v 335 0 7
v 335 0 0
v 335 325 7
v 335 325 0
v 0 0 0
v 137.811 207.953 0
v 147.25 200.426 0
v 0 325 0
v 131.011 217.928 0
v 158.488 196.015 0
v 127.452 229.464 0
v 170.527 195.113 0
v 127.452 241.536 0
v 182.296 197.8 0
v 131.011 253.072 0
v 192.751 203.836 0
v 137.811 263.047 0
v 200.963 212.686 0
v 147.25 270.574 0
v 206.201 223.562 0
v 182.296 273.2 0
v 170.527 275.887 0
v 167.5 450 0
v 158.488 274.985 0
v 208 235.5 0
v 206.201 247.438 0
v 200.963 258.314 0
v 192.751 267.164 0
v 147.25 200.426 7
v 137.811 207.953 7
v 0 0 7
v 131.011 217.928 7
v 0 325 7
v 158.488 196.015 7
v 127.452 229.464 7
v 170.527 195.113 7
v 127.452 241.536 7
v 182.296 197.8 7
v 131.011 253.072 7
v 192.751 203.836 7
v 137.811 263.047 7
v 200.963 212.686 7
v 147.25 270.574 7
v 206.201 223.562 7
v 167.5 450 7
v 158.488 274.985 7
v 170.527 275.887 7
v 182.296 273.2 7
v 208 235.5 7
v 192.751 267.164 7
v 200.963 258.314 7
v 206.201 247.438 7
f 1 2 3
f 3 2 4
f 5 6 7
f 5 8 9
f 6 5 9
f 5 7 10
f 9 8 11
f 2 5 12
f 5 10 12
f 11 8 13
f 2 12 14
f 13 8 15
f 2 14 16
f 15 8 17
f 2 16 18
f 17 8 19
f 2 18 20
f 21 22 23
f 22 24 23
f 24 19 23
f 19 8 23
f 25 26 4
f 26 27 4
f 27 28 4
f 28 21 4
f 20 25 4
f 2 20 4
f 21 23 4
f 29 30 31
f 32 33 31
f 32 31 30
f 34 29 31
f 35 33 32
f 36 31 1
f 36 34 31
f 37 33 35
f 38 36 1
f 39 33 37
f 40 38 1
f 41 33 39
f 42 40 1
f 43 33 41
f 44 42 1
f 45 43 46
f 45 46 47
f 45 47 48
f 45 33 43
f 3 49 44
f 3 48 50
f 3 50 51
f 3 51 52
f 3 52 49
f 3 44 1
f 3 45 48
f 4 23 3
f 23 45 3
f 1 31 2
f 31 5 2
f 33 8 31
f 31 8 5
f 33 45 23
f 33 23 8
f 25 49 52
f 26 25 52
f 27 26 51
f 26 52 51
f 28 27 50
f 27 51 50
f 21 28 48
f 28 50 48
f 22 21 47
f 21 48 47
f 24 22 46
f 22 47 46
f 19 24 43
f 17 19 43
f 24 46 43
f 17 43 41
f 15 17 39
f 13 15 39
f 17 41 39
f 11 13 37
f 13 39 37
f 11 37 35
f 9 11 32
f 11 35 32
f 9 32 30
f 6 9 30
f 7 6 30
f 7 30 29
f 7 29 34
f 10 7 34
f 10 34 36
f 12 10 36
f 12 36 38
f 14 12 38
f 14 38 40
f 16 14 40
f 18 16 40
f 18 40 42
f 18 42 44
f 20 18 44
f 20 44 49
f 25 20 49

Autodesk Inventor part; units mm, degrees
ref_plane "YZ Plane" through (0, 0, 0) normal (1, 0, 0) x (0, 1, 0)
ref_plane "XZ Plane" through (0, 0, 0) normal (0, 1, 0) x (-1, 0, 0)
ref_plane "XY Plane" through (0, 0, 0) normal (0, 0, 1) x (1, 0, 0)
sketch "Sketch1" plane through (0, 0, 0) normal (0, 0, 1) x (1, 0, 0)
  point P0 (0, 0)
sketch "Sketch2" plane through (0, 0, 0) normal (0, 0, 1) x (1, 0, 0)
  line L0 (0, 0) -> (335, 0)
  line L1 (335, 0) -> (335, 450)
  line L2 (335, 450) -> (0, 450)
  line L3 (0, 450) -> (0, 0)
  line L4 (0, 0) -> (167.5, 0)
  dimension "d0" = 335
  dimension "d1" = 450
  dimension "d2" = 167.5
extrude "Extrusion1" add sketch "Sketch2" along normal blind 7
sketch "Sketch3" plane through (0, 0, 7) normal (0, 0, 1) x (1, 0, 0)
  line L0 (0, 0) -> (167.5, 0)
  line L1 (0, 0) -> (335, 0) projected
  line L2 (167.5, 0) -> (167.5, 450)
  line L3 (335, 450) -> (0, 450) projected
  line L4 (0, 0) -> (0, 325)
  line L5 (0, 450) -> (0, 0) projected
  line L6 (0, 325) -> (335, 325)
  line L7 (335, 0) -> (335, 450) projected
  line L8 (335, 325) -> (167.5, 450)
  line L9 (167.5, 450) -> (0, 325)
  dimension "d5" = 167.5
  dimension "d6" = 325
extrude "Extrusion2" cut sketch "Sketch3" against normal blind 166.0375 contours L5 L3 L9
sketch "Sketch5" plane through (0, 0, 7) normal (0, 0, 1) x (1, 0, 0)
  line L0 (167.5, 450) -> (335, 450)
  line L1 (335, 450) -> (167.5, 450) projected
  line L2 (335, 450) -> (335, 0)
  line L3 (335, 0) -> (335, 450) projected
  line L4 (335, 0) -> (335, 325)
  line L5 (167.5, 450) -> (335, 325)
  line L6 (335, 450) -> (167.5, 450)
  line L7 (335, 325) -> (335, 450)
  point P0 (0, 0)
  dimension "d10" = 325
extrude "Extrusion3" cut sketch "Sketch5" against normal blind 305.45
sketch "Sketch11" plane through (0, 0, 7) normal (0, 0, 1) x (1, 0, 0)
  line L0 (0, 325) -> (335, 325)
  line L1 (335, 325) -> (167.5, 325)
  line L2 (167.5, 325) -> (167.5, 276)
  line L3 (167.5, 276) -> (167.5, 195)
  line L4 (167.5, 195) -> (167.5, 235.5)
  circle A0 centre (167.5, 235.5) radius 40.5
  point P0 (0, 0)
  dimension "d29" = 49
  dimension "d30" = 81
extrude "Extrusion6" cut sketch "Sketch11" against normal blind 10
properties part number "fundo" material "Polycarbonate, Clear"
